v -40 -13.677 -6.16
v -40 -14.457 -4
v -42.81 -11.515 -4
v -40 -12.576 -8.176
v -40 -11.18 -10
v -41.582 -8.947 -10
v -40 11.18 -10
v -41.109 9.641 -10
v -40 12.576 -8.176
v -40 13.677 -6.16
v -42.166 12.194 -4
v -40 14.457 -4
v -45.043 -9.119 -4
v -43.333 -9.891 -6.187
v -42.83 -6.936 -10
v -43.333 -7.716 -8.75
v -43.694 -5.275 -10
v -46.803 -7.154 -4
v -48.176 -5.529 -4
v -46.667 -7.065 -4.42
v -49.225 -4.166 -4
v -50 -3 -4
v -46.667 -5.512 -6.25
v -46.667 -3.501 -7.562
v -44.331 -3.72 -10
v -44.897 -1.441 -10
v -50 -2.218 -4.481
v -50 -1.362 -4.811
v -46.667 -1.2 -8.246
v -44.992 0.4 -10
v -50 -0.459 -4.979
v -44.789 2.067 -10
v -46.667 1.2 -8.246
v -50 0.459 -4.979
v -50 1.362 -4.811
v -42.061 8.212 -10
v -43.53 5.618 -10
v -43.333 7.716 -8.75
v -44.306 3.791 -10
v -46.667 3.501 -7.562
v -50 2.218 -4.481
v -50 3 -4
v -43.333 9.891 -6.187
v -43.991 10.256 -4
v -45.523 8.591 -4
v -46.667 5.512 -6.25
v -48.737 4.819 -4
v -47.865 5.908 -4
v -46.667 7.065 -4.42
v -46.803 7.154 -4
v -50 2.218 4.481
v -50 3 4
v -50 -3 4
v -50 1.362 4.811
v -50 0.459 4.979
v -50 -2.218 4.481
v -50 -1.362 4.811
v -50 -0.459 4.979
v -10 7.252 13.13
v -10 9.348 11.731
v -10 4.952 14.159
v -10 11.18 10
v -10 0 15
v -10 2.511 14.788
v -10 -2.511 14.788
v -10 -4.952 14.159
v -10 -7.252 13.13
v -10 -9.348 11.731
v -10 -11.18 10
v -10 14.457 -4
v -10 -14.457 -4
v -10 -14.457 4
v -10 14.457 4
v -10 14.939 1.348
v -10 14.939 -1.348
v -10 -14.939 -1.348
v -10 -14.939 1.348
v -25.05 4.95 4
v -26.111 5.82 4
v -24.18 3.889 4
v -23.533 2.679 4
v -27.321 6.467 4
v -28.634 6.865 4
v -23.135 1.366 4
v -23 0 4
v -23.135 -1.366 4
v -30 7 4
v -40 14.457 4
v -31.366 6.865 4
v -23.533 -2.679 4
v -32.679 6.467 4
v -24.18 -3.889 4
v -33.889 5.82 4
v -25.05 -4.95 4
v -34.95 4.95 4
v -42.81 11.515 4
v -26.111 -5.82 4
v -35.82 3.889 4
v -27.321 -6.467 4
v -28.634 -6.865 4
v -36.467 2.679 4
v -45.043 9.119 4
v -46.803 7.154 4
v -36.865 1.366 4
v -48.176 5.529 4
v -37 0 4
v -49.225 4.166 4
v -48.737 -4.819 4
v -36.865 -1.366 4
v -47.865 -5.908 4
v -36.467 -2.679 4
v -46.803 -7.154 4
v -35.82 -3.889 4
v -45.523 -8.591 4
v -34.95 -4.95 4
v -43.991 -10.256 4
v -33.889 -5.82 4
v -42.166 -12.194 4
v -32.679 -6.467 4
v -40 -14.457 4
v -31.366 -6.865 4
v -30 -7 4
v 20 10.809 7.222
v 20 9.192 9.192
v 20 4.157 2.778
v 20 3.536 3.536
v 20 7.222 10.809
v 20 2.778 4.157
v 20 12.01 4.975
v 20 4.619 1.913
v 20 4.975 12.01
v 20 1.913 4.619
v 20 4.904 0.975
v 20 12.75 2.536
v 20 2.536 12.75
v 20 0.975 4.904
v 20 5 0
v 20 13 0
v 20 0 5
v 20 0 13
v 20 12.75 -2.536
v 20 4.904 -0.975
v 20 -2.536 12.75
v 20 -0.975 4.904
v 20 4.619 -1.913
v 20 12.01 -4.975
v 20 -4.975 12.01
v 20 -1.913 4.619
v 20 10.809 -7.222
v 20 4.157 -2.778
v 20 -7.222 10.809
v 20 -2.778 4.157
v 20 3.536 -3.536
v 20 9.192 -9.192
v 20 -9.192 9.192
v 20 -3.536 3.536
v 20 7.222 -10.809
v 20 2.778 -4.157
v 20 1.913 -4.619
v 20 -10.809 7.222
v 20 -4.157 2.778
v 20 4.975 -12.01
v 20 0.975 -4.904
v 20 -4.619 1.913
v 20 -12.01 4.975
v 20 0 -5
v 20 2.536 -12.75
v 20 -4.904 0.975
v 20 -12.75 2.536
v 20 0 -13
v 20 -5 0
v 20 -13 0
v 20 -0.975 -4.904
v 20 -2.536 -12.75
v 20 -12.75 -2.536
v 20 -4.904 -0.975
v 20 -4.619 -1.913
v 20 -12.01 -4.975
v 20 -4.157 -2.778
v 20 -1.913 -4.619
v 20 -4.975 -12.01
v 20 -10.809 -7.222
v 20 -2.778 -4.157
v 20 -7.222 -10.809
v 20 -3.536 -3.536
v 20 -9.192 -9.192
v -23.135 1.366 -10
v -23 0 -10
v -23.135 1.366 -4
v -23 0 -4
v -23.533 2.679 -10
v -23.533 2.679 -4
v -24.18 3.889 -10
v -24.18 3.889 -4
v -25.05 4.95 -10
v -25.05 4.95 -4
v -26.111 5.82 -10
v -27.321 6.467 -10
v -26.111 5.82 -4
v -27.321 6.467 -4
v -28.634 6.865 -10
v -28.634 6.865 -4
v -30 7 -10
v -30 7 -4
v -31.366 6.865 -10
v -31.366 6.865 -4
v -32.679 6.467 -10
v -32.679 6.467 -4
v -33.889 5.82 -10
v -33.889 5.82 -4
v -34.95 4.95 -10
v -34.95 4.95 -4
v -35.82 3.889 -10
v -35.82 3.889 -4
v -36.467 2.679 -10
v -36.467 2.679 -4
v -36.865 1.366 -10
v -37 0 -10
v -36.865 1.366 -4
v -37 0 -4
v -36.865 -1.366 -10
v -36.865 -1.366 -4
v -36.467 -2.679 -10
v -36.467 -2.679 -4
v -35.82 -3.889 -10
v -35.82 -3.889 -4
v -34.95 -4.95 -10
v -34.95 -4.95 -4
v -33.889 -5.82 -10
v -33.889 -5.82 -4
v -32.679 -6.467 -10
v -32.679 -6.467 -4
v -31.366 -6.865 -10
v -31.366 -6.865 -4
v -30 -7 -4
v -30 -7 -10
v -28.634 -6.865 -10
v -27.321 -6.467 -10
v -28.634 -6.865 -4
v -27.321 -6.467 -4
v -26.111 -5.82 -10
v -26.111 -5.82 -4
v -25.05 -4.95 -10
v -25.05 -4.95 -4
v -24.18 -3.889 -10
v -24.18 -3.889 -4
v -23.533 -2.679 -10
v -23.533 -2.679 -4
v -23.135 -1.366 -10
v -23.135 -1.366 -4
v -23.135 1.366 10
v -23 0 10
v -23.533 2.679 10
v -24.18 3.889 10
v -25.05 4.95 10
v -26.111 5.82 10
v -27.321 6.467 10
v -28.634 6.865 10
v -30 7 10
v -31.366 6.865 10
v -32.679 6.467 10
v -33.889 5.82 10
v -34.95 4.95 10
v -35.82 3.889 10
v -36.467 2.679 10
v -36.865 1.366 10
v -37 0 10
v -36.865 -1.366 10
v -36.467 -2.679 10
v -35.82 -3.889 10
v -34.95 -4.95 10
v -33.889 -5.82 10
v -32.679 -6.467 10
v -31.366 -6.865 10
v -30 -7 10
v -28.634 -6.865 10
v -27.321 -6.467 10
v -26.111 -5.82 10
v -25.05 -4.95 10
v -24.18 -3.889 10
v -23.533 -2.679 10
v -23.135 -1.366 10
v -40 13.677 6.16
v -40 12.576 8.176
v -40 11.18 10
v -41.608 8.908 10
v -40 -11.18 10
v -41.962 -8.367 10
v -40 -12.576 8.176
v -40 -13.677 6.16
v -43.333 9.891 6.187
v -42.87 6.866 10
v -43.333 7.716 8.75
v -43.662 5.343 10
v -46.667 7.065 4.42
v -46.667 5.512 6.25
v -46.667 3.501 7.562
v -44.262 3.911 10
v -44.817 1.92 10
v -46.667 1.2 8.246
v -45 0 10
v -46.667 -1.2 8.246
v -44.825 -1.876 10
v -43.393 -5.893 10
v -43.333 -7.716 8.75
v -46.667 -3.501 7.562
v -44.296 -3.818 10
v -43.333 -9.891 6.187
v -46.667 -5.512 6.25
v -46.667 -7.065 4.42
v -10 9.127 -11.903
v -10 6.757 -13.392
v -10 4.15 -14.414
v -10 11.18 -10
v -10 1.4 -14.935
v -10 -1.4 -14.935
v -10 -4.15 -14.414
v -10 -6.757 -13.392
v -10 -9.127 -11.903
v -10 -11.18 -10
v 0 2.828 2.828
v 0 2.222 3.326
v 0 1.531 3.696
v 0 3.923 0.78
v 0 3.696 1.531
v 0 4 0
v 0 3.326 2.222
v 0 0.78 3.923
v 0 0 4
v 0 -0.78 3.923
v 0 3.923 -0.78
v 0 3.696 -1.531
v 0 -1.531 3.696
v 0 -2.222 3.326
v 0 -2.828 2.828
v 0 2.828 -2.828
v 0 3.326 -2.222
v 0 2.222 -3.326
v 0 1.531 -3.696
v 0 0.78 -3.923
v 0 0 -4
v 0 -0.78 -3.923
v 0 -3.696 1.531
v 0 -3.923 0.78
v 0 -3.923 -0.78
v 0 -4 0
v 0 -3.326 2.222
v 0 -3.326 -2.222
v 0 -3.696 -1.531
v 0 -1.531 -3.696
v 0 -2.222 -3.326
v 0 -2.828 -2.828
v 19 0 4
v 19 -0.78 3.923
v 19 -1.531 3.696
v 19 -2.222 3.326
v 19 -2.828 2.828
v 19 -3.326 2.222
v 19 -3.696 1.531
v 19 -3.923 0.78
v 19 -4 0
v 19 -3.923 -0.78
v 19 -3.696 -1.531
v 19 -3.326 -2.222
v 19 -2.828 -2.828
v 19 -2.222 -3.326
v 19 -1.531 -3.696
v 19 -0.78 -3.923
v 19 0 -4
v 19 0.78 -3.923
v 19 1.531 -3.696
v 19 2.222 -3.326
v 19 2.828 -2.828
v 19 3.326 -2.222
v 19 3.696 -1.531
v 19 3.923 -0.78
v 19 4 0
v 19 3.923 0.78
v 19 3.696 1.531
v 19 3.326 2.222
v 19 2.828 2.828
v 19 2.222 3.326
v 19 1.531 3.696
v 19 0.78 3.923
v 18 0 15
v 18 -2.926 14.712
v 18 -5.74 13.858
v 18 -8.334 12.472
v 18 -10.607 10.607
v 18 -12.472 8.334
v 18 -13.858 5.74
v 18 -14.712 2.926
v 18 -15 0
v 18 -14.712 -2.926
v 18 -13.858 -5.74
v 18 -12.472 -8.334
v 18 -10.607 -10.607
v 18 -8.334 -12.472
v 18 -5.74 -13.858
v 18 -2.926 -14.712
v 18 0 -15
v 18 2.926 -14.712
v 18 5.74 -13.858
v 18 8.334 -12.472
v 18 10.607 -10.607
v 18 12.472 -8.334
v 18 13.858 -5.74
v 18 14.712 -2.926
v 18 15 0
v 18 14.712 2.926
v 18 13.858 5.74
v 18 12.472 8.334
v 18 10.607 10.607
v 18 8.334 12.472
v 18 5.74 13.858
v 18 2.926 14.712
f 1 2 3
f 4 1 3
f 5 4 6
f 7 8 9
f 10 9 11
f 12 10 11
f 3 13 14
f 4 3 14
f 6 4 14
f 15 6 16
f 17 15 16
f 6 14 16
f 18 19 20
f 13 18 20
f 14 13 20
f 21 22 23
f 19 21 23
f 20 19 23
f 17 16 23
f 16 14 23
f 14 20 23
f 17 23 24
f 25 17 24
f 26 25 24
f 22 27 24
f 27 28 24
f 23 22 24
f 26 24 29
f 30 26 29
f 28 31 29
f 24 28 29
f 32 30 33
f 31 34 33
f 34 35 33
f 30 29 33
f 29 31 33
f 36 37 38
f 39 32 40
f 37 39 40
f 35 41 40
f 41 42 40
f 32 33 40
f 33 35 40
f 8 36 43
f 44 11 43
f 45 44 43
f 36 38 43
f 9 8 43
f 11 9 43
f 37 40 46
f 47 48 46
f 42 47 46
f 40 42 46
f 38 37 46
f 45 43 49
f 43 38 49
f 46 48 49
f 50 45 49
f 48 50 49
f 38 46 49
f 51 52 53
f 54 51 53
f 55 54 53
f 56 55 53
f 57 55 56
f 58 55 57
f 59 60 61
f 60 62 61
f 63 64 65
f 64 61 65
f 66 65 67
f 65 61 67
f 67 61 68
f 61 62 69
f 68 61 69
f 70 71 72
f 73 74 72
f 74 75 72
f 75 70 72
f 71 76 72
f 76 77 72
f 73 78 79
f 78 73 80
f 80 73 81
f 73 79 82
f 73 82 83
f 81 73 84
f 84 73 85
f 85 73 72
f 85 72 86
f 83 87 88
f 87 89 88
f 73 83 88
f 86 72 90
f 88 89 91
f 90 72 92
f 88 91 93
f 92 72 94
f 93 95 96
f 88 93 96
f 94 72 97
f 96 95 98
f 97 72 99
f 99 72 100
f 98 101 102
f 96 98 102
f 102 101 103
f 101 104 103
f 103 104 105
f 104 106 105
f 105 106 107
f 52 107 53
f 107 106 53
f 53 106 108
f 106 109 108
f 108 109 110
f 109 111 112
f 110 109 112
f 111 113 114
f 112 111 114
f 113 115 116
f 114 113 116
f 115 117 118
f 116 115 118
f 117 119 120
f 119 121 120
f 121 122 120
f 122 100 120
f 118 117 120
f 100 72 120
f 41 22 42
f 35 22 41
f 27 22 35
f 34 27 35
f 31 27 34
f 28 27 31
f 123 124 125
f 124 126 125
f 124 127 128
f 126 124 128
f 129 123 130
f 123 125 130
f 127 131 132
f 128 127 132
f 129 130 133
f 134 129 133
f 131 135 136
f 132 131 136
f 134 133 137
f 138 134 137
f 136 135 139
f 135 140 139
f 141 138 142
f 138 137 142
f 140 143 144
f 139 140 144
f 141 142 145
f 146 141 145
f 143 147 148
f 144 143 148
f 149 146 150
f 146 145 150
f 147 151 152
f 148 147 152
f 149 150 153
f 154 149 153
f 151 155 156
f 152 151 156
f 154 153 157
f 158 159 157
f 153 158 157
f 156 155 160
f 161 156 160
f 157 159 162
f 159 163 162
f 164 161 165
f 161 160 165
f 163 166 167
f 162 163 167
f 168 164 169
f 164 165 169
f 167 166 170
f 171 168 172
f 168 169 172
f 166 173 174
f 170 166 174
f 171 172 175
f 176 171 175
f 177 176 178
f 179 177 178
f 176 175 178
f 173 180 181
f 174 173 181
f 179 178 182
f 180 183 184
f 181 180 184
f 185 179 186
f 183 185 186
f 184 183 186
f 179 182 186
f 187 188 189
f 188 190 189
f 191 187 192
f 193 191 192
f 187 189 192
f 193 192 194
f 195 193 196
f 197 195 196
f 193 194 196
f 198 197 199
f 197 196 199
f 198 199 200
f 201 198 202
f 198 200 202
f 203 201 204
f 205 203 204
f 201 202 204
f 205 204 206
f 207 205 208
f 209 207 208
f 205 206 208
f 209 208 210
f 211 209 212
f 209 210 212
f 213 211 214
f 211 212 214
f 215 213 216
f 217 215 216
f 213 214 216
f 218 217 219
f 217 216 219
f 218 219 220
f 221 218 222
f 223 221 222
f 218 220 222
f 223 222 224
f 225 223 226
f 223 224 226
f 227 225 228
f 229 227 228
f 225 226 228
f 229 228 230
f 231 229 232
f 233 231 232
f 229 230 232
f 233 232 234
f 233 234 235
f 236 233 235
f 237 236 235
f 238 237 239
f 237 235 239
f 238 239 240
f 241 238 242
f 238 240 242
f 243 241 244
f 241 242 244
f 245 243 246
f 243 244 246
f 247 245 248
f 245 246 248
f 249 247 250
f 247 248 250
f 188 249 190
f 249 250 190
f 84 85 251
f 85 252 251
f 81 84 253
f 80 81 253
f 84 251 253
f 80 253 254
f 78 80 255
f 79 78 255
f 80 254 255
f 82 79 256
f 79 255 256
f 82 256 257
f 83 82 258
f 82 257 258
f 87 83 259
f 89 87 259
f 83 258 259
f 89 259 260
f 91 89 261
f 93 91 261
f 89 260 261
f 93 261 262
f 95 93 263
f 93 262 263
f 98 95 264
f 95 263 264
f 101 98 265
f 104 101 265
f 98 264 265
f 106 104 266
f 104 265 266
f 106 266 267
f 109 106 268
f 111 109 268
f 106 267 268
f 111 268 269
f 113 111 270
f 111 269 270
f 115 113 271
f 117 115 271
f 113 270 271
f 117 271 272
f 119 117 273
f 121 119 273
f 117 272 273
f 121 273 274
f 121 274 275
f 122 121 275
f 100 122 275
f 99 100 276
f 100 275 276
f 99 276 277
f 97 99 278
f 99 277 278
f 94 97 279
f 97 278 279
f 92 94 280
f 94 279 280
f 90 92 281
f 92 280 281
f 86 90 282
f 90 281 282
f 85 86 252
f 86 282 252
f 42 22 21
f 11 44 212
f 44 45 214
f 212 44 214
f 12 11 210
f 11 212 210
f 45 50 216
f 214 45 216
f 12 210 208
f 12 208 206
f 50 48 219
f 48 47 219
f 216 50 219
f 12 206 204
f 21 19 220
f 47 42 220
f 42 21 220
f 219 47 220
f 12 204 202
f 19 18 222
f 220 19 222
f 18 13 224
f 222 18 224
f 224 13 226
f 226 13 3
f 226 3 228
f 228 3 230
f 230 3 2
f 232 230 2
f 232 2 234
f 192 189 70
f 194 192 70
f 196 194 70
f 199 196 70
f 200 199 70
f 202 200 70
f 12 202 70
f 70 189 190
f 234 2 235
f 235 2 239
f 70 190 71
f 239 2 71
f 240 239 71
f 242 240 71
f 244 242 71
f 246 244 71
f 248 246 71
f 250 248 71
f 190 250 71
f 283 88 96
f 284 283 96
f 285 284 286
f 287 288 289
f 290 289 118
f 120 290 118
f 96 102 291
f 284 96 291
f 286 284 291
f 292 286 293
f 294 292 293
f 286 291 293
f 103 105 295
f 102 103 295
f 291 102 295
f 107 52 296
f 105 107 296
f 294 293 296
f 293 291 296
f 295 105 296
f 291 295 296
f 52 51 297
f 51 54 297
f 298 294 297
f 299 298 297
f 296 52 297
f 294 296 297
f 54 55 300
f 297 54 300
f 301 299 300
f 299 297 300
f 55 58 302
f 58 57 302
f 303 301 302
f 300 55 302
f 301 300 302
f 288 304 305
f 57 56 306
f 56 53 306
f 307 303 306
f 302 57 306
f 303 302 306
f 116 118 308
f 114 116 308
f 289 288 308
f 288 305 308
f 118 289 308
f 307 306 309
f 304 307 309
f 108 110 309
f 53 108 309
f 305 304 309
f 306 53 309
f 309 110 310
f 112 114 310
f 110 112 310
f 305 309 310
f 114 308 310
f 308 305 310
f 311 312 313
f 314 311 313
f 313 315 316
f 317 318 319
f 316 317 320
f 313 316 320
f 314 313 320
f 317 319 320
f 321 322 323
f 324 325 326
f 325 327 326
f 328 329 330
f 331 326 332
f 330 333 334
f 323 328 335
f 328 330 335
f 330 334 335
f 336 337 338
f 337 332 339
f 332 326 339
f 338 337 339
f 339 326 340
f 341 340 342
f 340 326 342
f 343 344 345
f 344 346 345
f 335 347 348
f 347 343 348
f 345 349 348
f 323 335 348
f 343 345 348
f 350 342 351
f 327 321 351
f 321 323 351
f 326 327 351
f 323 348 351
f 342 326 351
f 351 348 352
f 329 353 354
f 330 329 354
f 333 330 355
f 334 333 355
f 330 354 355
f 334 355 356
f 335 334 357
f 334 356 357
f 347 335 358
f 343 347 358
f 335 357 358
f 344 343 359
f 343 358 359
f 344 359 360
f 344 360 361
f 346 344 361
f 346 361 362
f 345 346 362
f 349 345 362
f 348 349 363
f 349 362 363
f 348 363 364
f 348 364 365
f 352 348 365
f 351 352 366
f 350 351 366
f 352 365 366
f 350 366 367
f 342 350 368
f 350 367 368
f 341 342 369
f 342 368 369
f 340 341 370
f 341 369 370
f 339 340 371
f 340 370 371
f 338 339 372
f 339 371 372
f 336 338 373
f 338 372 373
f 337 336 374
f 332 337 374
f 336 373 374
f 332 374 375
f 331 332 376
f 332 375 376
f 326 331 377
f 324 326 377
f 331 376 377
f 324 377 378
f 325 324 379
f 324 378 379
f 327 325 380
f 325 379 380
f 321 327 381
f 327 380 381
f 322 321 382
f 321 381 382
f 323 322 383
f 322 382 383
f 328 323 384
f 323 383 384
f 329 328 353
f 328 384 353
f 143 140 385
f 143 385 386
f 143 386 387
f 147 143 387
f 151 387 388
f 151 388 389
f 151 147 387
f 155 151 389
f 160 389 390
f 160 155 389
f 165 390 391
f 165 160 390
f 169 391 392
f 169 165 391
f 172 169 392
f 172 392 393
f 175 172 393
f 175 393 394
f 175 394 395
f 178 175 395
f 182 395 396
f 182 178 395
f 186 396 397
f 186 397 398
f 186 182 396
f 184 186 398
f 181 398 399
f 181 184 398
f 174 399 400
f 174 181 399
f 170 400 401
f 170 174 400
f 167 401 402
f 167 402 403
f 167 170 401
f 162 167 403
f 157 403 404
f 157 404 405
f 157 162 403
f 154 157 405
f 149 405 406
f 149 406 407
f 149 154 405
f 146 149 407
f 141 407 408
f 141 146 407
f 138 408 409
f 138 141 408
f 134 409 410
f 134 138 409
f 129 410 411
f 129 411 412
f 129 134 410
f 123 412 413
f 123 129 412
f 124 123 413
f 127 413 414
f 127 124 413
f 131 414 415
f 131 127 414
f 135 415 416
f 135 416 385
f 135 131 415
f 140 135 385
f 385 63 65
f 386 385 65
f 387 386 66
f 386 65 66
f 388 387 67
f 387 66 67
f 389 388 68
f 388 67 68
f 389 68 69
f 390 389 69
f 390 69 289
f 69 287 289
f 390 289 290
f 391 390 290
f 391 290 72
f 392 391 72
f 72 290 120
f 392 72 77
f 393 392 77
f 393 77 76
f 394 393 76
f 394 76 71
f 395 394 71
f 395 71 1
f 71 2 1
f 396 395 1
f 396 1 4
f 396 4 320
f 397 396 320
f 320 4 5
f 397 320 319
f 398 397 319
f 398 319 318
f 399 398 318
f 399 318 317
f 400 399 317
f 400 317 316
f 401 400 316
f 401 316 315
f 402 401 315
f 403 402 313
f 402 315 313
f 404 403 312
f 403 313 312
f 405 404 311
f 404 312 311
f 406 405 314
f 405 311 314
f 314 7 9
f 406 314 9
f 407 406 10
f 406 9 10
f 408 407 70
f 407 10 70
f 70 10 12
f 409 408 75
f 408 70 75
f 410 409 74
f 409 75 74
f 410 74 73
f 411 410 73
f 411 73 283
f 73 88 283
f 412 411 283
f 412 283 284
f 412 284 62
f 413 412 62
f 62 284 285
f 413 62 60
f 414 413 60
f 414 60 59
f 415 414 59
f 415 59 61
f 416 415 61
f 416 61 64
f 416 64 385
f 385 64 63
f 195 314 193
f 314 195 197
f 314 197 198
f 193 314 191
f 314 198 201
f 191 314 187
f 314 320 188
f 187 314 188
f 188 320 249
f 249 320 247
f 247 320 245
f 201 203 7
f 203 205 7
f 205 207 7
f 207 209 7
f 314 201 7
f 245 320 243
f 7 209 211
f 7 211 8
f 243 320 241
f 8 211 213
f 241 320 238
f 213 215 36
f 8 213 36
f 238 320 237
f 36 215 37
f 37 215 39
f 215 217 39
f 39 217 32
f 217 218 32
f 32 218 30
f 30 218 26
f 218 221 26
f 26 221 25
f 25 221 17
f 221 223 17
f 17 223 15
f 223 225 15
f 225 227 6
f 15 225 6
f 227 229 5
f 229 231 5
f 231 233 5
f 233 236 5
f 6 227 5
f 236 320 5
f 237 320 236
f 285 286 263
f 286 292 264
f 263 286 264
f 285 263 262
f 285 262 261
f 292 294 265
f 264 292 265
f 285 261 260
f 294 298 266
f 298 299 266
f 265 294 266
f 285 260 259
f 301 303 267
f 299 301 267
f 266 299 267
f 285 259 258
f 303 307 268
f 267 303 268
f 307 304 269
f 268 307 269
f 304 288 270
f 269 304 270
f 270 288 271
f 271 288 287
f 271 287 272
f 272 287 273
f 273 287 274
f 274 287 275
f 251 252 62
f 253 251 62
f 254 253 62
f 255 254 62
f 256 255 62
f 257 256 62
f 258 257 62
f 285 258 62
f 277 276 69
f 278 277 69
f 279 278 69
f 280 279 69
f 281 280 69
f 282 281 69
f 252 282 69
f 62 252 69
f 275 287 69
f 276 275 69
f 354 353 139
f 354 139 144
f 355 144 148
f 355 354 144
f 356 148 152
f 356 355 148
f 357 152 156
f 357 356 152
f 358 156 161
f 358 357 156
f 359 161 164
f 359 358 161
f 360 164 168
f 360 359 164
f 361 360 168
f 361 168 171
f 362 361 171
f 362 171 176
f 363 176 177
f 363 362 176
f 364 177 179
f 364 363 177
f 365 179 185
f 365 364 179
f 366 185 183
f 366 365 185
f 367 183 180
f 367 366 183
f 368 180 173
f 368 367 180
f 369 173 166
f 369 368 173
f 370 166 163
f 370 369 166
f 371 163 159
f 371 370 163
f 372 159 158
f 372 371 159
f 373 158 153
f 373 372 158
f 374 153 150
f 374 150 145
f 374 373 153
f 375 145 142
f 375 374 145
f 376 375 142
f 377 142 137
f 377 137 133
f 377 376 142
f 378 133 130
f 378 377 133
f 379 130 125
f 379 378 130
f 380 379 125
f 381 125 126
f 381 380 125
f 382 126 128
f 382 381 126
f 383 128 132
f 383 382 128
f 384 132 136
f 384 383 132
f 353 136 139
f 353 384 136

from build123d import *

# Parameters (mm, degrees)
F3_SIZE  = 10
F4_DEPTH = 25
F5_R     = 7
F6_DEPTH = 25
F7_SIZE  = 2
F8_SIZE  = 1


with BuildPart() as f1:
    # F0 (on Front) → F1 (revolve)
    with BuildSketch(Plane.XZ):
        Polygon((-50, 0), (0, 0), (0, 4), (20, 4), (20, 15), (-50, 15), align=None)
    revolve(axis=Axis((-25, 0, 0), (1, 0, 0)))

    # F3
    f3_edges = [f1.edges().sort_by_distance(p)[0] for p in [
        (-50, 0, -15),
    ]]
    chamfer(f3_edges, length=F3_SIZE)

    # F2 (on Front) → F4 (cut, symmetric)
    with BuildSketch(Plane.XZ):
        Polygon((-60.617507, 4), (-60.617507, 0), (-60.617507, -4), (-60.617507, -15), (-10, -15), (-10, -10), (-55.020042, -10), (-55.020042, -4), (-10, -4), (-10, -2), (-10, 2), (-10, 4), (-55.020042, 4), (-55.020042, 10), (-10, 10), (-10, 15), (-60.617507, 15), align=None)
    extrude(amount=F4_DEPTH, both=True, mode=Mode.SUBTRACT)

    # F5 (on Top) → F6 (cut, symmetric)
    with BuildSketch(Plane.XY):
        with Locations((-30, 0)):
            Circle(F5_R)
    extrude(amount=F6_DEPTH, both=True, mode=Mode.SUBTRACT)

    # F7
    f7_edges = [f1.edges().sort_by_distance(p)[0] for p in [
        (20, 0, -15),
    ]]
    chamfer(f7_edges, length=F7_SIZE)

    # F8
    f8_edges = [f1.edges().sort_by_distance(p)[0] for p in [
        (20, 0, -4),
    ]]
    chamfer(f8_edges, length=F8_SIZE)


solid = f1.part
